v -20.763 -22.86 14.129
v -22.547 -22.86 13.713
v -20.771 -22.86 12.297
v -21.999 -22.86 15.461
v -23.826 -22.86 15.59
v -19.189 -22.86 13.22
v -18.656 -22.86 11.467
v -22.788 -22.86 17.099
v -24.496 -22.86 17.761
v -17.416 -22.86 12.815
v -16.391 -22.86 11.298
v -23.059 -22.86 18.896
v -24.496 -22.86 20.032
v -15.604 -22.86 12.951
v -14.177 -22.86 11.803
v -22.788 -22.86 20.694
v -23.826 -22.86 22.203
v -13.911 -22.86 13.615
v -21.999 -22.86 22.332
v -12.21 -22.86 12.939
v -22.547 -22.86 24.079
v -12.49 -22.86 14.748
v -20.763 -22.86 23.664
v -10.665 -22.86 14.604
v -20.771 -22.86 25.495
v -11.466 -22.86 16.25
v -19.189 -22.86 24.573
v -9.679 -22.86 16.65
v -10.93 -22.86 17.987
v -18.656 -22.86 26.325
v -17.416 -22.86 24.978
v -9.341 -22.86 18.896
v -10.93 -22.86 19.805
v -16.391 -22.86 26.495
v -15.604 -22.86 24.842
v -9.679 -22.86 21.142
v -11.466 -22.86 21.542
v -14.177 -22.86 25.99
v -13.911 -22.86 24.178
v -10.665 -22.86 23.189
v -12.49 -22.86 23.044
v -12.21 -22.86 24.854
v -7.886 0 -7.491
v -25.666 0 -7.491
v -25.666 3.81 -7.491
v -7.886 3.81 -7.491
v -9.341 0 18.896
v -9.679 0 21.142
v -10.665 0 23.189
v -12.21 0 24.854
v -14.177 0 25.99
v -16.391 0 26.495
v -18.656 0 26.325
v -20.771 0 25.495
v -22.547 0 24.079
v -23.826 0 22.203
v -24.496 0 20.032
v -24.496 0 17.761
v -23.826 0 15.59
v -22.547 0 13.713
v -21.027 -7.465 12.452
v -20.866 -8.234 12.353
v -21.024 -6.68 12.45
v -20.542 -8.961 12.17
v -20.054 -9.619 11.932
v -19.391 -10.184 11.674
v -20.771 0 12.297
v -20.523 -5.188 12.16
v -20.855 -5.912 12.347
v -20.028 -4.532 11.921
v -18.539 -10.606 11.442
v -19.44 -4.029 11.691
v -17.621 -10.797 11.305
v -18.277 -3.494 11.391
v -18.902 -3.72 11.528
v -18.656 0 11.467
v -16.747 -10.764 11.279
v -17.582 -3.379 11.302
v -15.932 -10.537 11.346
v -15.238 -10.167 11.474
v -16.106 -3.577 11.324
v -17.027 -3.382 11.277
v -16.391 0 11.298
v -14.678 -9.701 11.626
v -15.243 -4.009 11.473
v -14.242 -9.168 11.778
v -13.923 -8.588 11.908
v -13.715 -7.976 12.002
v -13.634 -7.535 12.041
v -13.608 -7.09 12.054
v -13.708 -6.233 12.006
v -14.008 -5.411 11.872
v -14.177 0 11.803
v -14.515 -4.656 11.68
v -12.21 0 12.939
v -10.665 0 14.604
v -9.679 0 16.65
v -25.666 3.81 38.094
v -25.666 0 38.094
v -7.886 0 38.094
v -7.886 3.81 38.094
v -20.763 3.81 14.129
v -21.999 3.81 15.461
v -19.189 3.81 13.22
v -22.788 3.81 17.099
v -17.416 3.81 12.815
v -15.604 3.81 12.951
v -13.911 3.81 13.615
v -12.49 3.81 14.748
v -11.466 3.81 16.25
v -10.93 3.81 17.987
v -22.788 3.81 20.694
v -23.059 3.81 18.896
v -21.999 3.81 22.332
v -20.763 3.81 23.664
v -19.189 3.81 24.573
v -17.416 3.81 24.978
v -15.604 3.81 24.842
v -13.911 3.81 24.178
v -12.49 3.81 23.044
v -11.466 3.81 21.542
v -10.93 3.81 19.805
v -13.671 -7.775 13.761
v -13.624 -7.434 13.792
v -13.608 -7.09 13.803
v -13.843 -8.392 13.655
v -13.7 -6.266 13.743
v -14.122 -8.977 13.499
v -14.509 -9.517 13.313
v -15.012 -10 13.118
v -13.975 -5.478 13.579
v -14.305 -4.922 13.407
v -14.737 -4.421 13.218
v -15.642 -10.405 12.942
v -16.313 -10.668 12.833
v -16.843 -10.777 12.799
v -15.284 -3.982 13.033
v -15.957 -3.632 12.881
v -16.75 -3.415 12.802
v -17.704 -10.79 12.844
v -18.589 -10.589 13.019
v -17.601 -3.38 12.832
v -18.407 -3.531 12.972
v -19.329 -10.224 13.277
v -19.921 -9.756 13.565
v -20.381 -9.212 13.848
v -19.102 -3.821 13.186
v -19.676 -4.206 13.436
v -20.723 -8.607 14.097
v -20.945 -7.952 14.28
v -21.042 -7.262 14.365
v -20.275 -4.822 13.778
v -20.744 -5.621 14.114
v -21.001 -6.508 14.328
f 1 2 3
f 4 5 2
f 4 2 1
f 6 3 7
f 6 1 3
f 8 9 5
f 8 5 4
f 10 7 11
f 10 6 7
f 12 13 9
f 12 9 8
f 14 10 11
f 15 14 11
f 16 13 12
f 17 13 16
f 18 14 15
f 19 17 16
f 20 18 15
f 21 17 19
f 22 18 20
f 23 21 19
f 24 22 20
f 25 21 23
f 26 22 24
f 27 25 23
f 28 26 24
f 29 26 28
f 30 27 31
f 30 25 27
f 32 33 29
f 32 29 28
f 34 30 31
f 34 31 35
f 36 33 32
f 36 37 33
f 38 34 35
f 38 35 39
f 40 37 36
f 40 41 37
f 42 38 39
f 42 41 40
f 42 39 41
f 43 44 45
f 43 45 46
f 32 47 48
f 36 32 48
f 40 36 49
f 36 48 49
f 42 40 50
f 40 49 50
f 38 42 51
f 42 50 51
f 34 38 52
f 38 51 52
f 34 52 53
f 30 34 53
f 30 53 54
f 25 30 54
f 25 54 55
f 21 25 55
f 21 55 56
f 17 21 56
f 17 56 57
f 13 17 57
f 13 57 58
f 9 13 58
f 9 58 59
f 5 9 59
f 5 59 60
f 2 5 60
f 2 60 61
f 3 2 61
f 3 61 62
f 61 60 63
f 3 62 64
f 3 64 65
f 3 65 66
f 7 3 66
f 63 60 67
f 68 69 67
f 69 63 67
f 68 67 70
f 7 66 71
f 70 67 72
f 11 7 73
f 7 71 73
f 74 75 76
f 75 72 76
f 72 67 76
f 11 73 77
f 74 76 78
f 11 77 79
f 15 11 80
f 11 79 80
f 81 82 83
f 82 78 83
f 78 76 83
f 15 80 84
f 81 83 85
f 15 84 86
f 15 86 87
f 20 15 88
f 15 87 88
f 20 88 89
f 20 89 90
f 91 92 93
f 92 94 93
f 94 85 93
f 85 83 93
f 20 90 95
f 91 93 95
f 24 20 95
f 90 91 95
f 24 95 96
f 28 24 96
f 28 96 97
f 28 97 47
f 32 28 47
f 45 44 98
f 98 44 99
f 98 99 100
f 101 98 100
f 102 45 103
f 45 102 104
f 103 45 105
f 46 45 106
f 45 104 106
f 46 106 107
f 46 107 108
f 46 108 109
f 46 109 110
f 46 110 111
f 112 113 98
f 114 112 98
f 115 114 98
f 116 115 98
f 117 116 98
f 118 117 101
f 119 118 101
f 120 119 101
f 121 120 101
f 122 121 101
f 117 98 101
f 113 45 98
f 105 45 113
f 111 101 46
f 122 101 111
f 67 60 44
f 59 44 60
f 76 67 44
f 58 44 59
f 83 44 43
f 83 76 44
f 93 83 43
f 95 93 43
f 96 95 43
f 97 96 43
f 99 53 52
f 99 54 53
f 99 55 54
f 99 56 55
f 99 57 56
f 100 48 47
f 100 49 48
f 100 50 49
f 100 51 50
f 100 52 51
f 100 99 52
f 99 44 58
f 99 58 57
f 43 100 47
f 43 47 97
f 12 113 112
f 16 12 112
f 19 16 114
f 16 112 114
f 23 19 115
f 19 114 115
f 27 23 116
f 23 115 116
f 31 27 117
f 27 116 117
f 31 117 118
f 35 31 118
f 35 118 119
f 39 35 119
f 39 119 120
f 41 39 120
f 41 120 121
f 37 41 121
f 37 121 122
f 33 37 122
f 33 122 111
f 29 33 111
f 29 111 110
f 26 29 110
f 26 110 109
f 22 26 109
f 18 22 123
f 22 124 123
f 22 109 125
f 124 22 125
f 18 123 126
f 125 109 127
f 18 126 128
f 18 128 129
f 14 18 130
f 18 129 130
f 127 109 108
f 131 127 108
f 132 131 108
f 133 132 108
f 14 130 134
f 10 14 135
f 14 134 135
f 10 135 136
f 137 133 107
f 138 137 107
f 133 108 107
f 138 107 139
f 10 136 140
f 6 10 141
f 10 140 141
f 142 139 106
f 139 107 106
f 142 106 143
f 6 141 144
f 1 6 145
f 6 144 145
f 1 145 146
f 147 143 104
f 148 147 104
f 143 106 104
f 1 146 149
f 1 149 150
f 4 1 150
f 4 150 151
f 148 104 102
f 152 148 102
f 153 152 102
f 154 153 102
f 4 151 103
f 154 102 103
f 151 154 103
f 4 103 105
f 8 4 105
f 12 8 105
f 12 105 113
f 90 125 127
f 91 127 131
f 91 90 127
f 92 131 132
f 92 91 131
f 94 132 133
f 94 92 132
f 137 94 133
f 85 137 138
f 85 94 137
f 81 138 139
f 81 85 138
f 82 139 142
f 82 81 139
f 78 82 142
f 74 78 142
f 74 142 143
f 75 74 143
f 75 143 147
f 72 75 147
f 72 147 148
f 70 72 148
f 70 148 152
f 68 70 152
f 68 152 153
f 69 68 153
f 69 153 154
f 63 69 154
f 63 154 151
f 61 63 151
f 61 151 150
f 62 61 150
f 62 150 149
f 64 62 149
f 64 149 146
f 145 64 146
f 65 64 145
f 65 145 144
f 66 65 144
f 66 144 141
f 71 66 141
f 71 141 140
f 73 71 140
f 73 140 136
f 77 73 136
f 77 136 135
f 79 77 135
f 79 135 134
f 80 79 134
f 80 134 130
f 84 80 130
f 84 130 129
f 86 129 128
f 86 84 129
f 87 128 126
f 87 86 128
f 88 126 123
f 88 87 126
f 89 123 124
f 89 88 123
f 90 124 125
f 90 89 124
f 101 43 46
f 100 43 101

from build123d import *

# Parameters (mm, degrees)
F0_R      = 7.62
F1_DEPTH  = 22.86
F2_R      = 5.3975
F3_DEPTH  = 25.4
F4_W      = 17.78
F4_H      = 45.5848994723
F5_DEPTH  = 3.81
F6_DEPTH  = 25.4
F7_R      = 6.0983154317
F8_DEPTH  = 25.4
F9_R      = 3.7193661061
F10_DEPTH = 17.78
F11_DEPTH = 25.4


with BuildPart() as f1:
    # F0 (on Front) → F1 (new body)
    with BuildSketch(Plane.XZ):
        with Locations((-16.9606450945, 18.8963711262)):
            Circle(F0_R)
    extrude(amount=F1_DEPTH)

    # F2 (on face) → F3 (cut)
    with BuildSketch(Plane.XZ.offset(22.86)):
        with Locations((-16.9606450945, 18.8963711262)):
            Circle(F2_R)
    extrude(amount=-F3_DEPTH, mode=Mode.SUBTRACT)

    # F4 (on Front) → F5 (join)
    with BuildSketch(Plane.XZ):
        with Locations((-16.7762902565, 15.3014517855)):
            Rectangle(F4_W, F4_H)
    extrude(amount=-F5_DEPTH)

    # F6 (cut): a face of the model
    f6_faces = [f1.faces().sort_by_distance(p)[0] for p in [
        (-16.9606450945, 0, 18.8963711262),
    ]]
    extrude(f6_faces, amount=-F6_DEPTH, mode=Mode.SUBTRACT)

    # F7 (on face) → F8 (cut)
    with BuildSketch(Plane(origin=(0, 3.81, 0), x_dir=(-1, 0, 0), z_dir=(0, 1, 0))):
        with Locations((16.9606450945, 18.8963711262)):
            Circle(F7_R)
    extrude(amount=-F8_DEPTH, mode=Mode.SUBTRACT)

    # F9 (on Top) → F10 (cut)
    with BuildSketch(Plane.XY):
        with Locations((-17.3269938678, -7.0897382684)):
            Circle(F9_R)
    extrude(amount=F10_DEPTH, mode=Mode.SUBTRACT)

    # F11 (cut): a face of the model
    f11_faces = [f1.faces().sort_by_distance(p)[0] for p in [
        (-11.0348160706, -21.59, 18.8963711262),
    ]]
    extrude(f11_faces, amount=-F11_DEPTH, mode=Mode.SUBTRACT)


solid = f1.part
